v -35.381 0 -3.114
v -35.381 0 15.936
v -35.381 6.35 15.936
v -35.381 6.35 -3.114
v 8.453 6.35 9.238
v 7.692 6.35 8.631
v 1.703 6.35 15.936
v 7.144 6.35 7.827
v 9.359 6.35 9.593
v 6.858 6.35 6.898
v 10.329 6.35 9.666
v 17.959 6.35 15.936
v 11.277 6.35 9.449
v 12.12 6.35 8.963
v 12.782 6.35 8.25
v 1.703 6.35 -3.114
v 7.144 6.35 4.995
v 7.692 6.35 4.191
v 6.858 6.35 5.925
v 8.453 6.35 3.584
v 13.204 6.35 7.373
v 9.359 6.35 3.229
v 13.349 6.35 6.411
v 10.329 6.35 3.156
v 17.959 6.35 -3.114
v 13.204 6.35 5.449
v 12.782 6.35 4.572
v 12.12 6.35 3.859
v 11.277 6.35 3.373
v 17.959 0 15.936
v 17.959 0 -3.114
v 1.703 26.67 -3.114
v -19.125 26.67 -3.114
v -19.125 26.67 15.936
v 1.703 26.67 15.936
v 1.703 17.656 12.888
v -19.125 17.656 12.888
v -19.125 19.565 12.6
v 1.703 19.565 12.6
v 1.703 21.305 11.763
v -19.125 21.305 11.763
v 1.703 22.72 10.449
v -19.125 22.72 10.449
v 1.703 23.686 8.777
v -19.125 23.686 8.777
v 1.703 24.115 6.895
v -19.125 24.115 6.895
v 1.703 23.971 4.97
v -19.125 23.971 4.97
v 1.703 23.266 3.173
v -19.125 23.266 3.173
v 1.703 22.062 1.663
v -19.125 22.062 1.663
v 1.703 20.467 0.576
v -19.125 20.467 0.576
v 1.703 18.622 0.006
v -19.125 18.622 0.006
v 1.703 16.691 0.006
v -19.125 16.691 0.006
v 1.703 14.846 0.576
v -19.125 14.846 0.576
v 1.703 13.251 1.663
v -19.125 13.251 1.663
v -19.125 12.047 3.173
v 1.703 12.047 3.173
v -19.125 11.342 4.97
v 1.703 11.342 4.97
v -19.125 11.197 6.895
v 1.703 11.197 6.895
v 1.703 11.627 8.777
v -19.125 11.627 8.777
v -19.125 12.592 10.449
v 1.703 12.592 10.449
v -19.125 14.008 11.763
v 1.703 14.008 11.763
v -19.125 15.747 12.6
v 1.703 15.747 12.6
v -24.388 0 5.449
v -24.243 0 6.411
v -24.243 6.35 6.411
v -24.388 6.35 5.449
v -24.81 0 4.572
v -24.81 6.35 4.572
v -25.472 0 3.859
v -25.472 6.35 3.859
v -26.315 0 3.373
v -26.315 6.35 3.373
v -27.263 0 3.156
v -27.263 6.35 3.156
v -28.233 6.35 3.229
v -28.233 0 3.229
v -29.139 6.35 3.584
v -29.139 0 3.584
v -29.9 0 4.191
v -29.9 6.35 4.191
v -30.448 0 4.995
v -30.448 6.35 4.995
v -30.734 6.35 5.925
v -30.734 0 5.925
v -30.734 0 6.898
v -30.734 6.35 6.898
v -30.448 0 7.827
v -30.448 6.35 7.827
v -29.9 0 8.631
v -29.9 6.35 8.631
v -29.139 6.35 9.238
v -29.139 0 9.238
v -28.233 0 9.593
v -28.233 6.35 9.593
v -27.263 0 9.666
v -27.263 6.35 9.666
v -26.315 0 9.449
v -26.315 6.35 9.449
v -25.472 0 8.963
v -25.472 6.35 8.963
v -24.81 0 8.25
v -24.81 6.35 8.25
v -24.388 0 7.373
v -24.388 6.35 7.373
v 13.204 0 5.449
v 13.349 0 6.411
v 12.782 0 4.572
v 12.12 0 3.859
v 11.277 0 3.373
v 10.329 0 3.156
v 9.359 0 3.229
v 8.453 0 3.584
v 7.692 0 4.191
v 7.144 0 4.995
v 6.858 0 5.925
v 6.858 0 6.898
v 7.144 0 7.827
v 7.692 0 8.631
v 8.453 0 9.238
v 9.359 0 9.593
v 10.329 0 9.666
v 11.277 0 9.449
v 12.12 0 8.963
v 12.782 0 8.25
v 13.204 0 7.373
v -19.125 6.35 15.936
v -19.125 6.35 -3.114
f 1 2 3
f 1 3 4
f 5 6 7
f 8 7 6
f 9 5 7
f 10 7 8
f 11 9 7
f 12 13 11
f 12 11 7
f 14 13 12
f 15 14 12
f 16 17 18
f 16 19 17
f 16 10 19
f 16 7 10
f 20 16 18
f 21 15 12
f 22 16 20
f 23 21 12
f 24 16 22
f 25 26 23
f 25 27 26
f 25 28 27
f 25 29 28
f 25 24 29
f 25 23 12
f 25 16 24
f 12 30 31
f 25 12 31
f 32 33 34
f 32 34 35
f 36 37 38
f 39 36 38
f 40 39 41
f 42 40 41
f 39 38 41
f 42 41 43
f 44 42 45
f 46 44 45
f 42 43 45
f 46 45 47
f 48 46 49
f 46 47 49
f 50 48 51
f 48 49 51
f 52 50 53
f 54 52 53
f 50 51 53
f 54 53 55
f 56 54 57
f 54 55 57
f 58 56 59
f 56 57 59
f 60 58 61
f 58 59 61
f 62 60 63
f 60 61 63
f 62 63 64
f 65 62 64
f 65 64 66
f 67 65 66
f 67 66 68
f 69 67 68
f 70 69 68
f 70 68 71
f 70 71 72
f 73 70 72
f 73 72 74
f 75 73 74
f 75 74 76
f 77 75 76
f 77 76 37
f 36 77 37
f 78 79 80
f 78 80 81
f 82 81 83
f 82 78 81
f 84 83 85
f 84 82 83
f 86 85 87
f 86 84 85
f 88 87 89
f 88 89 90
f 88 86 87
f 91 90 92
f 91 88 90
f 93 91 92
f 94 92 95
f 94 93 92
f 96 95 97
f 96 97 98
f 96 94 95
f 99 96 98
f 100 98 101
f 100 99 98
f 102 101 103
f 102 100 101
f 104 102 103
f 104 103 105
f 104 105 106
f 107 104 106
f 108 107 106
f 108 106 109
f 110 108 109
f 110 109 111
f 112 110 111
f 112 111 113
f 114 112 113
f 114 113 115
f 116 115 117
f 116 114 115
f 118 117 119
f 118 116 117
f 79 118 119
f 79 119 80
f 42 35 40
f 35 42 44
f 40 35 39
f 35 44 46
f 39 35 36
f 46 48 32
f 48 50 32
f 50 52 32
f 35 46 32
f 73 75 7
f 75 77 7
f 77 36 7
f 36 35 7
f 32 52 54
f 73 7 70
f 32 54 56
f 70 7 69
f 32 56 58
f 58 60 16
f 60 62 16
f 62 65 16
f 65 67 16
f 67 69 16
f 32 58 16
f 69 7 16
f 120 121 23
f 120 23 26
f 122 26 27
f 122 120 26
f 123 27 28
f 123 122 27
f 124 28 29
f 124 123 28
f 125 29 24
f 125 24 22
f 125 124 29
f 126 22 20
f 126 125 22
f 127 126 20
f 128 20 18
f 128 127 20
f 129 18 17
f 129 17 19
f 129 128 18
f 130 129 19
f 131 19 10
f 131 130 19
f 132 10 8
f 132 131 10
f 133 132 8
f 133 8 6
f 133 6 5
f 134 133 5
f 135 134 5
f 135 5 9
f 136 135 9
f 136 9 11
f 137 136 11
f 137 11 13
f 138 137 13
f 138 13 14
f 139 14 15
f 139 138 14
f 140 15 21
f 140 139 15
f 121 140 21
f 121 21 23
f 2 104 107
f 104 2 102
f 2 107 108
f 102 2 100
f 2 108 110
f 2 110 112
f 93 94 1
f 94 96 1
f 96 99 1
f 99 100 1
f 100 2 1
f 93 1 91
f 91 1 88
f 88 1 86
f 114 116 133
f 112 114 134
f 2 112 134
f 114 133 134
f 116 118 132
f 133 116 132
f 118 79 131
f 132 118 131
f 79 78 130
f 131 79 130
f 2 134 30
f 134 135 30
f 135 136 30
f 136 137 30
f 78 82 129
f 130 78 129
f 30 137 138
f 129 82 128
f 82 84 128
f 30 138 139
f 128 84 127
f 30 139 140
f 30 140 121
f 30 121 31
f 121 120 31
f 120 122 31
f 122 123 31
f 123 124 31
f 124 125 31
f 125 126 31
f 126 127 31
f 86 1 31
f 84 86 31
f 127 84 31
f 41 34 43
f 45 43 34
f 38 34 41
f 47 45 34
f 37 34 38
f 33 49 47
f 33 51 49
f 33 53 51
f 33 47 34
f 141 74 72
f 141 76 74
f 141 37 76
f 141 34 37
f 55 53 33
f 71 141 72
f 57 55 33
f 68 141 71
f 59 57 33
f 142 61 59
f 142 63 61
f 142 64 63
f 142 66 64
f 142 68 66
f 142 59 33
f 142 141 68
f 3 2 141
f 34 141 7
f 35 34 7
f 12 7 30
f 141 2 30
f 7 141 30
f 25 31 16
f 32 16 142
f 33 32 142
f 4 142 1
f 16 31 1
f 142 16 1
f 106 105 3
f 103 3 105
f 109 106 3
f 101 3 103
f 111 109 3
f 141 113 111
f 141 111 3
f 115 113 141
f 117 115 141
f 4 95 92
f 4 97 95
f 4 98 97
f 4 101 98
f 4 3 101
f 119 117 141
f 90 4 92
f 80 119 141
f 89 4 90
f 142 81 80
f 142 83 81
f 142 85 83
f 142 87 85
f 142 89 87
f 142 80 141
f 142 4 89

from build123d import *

# Parameters (mm, degrees)
SKETCH1_W           = 15.494
SKETCH1_H           = 19.05
SKETCH1_R           = 3.2639
SKETCH1_W_2         = 22.352
BOSS_EXTRUDE3_DEPTH = 6.35
SKETCH3_W           = 20.828
SKETCH3_H           = 19.05
BOSS_EXTRUDE4_DEPTH = 20.32
CUT_EXTRUDE1_REACH  = 39.084
SKETCH4_R           = 6.477


with BuildPart() as part:
    # Sketch1 → Boss-Extrude3 (new body)
    with BuildSketch(Plane(origin=(0, 0, 0), x_dir=(1, 0, 0), z_dir=(0, 1, 0))):
        with Locations((-27.634045528, -6.411090754)):
            Rectangle(SKETCH1_W, SKETCH1_H)
        with Locations((-27.507045528, -6.411090754)):
            Circle(SKETCH1_R, mode=Mode.SUBTRACT)
        with Locations((-8.711045528, -6.411090754)):
            Rectangle(SKETCH1_W_2, SKETCH1_H)
        with Locations((10.211954472, -6.411090754)):
            Rectangle(SKETCH1_W, SKETCH1_H)
        with Locations((10.084954472, -6.411090754)):
            Circle(SKETCH1_R, mode=Mode.SUBTRACT)
    extrude(amount=BOSS_EXTRUDE3_DEPTH)

    # Sketch3 → Boss-Extrude4 (add)
    with BuildSketch(Plane(origin=(0, 6.35, 0), x_dir=(1, 0, 0), z_dir=(0, 1, 0))):
        with Locations((-8.711045528, -6.411090754)):
            Rectangle(SKETCH3_W, SKETCH3_H)
    extrude(amount=BOSS_EXTRUDE4_DEPTH)

    # Sketch4 → Cut-Extrude1 (cut, up to next)
    with BuildSketch(Plane.ZY.offset(19.125045528), mode=Mode.PRIVATE) as cut_extrude1_sk1:
        with Locations((6.411090754, 17.656309415)):
            Circle(SKETCH4_R)
    cut_extrude1_tool1 = extrude(cut_extrude1_sk1.sketch, amount=-CUT_EXTRUDE1_REACH, mode=Mode.PRIVATE) & part.part
    add(cut_extrude1_tool1.solids().sort_by_distance((-19.125046, 17.656309, 6.411091))[0], mode=Mode.SUBTRACT)


solid = part.part
